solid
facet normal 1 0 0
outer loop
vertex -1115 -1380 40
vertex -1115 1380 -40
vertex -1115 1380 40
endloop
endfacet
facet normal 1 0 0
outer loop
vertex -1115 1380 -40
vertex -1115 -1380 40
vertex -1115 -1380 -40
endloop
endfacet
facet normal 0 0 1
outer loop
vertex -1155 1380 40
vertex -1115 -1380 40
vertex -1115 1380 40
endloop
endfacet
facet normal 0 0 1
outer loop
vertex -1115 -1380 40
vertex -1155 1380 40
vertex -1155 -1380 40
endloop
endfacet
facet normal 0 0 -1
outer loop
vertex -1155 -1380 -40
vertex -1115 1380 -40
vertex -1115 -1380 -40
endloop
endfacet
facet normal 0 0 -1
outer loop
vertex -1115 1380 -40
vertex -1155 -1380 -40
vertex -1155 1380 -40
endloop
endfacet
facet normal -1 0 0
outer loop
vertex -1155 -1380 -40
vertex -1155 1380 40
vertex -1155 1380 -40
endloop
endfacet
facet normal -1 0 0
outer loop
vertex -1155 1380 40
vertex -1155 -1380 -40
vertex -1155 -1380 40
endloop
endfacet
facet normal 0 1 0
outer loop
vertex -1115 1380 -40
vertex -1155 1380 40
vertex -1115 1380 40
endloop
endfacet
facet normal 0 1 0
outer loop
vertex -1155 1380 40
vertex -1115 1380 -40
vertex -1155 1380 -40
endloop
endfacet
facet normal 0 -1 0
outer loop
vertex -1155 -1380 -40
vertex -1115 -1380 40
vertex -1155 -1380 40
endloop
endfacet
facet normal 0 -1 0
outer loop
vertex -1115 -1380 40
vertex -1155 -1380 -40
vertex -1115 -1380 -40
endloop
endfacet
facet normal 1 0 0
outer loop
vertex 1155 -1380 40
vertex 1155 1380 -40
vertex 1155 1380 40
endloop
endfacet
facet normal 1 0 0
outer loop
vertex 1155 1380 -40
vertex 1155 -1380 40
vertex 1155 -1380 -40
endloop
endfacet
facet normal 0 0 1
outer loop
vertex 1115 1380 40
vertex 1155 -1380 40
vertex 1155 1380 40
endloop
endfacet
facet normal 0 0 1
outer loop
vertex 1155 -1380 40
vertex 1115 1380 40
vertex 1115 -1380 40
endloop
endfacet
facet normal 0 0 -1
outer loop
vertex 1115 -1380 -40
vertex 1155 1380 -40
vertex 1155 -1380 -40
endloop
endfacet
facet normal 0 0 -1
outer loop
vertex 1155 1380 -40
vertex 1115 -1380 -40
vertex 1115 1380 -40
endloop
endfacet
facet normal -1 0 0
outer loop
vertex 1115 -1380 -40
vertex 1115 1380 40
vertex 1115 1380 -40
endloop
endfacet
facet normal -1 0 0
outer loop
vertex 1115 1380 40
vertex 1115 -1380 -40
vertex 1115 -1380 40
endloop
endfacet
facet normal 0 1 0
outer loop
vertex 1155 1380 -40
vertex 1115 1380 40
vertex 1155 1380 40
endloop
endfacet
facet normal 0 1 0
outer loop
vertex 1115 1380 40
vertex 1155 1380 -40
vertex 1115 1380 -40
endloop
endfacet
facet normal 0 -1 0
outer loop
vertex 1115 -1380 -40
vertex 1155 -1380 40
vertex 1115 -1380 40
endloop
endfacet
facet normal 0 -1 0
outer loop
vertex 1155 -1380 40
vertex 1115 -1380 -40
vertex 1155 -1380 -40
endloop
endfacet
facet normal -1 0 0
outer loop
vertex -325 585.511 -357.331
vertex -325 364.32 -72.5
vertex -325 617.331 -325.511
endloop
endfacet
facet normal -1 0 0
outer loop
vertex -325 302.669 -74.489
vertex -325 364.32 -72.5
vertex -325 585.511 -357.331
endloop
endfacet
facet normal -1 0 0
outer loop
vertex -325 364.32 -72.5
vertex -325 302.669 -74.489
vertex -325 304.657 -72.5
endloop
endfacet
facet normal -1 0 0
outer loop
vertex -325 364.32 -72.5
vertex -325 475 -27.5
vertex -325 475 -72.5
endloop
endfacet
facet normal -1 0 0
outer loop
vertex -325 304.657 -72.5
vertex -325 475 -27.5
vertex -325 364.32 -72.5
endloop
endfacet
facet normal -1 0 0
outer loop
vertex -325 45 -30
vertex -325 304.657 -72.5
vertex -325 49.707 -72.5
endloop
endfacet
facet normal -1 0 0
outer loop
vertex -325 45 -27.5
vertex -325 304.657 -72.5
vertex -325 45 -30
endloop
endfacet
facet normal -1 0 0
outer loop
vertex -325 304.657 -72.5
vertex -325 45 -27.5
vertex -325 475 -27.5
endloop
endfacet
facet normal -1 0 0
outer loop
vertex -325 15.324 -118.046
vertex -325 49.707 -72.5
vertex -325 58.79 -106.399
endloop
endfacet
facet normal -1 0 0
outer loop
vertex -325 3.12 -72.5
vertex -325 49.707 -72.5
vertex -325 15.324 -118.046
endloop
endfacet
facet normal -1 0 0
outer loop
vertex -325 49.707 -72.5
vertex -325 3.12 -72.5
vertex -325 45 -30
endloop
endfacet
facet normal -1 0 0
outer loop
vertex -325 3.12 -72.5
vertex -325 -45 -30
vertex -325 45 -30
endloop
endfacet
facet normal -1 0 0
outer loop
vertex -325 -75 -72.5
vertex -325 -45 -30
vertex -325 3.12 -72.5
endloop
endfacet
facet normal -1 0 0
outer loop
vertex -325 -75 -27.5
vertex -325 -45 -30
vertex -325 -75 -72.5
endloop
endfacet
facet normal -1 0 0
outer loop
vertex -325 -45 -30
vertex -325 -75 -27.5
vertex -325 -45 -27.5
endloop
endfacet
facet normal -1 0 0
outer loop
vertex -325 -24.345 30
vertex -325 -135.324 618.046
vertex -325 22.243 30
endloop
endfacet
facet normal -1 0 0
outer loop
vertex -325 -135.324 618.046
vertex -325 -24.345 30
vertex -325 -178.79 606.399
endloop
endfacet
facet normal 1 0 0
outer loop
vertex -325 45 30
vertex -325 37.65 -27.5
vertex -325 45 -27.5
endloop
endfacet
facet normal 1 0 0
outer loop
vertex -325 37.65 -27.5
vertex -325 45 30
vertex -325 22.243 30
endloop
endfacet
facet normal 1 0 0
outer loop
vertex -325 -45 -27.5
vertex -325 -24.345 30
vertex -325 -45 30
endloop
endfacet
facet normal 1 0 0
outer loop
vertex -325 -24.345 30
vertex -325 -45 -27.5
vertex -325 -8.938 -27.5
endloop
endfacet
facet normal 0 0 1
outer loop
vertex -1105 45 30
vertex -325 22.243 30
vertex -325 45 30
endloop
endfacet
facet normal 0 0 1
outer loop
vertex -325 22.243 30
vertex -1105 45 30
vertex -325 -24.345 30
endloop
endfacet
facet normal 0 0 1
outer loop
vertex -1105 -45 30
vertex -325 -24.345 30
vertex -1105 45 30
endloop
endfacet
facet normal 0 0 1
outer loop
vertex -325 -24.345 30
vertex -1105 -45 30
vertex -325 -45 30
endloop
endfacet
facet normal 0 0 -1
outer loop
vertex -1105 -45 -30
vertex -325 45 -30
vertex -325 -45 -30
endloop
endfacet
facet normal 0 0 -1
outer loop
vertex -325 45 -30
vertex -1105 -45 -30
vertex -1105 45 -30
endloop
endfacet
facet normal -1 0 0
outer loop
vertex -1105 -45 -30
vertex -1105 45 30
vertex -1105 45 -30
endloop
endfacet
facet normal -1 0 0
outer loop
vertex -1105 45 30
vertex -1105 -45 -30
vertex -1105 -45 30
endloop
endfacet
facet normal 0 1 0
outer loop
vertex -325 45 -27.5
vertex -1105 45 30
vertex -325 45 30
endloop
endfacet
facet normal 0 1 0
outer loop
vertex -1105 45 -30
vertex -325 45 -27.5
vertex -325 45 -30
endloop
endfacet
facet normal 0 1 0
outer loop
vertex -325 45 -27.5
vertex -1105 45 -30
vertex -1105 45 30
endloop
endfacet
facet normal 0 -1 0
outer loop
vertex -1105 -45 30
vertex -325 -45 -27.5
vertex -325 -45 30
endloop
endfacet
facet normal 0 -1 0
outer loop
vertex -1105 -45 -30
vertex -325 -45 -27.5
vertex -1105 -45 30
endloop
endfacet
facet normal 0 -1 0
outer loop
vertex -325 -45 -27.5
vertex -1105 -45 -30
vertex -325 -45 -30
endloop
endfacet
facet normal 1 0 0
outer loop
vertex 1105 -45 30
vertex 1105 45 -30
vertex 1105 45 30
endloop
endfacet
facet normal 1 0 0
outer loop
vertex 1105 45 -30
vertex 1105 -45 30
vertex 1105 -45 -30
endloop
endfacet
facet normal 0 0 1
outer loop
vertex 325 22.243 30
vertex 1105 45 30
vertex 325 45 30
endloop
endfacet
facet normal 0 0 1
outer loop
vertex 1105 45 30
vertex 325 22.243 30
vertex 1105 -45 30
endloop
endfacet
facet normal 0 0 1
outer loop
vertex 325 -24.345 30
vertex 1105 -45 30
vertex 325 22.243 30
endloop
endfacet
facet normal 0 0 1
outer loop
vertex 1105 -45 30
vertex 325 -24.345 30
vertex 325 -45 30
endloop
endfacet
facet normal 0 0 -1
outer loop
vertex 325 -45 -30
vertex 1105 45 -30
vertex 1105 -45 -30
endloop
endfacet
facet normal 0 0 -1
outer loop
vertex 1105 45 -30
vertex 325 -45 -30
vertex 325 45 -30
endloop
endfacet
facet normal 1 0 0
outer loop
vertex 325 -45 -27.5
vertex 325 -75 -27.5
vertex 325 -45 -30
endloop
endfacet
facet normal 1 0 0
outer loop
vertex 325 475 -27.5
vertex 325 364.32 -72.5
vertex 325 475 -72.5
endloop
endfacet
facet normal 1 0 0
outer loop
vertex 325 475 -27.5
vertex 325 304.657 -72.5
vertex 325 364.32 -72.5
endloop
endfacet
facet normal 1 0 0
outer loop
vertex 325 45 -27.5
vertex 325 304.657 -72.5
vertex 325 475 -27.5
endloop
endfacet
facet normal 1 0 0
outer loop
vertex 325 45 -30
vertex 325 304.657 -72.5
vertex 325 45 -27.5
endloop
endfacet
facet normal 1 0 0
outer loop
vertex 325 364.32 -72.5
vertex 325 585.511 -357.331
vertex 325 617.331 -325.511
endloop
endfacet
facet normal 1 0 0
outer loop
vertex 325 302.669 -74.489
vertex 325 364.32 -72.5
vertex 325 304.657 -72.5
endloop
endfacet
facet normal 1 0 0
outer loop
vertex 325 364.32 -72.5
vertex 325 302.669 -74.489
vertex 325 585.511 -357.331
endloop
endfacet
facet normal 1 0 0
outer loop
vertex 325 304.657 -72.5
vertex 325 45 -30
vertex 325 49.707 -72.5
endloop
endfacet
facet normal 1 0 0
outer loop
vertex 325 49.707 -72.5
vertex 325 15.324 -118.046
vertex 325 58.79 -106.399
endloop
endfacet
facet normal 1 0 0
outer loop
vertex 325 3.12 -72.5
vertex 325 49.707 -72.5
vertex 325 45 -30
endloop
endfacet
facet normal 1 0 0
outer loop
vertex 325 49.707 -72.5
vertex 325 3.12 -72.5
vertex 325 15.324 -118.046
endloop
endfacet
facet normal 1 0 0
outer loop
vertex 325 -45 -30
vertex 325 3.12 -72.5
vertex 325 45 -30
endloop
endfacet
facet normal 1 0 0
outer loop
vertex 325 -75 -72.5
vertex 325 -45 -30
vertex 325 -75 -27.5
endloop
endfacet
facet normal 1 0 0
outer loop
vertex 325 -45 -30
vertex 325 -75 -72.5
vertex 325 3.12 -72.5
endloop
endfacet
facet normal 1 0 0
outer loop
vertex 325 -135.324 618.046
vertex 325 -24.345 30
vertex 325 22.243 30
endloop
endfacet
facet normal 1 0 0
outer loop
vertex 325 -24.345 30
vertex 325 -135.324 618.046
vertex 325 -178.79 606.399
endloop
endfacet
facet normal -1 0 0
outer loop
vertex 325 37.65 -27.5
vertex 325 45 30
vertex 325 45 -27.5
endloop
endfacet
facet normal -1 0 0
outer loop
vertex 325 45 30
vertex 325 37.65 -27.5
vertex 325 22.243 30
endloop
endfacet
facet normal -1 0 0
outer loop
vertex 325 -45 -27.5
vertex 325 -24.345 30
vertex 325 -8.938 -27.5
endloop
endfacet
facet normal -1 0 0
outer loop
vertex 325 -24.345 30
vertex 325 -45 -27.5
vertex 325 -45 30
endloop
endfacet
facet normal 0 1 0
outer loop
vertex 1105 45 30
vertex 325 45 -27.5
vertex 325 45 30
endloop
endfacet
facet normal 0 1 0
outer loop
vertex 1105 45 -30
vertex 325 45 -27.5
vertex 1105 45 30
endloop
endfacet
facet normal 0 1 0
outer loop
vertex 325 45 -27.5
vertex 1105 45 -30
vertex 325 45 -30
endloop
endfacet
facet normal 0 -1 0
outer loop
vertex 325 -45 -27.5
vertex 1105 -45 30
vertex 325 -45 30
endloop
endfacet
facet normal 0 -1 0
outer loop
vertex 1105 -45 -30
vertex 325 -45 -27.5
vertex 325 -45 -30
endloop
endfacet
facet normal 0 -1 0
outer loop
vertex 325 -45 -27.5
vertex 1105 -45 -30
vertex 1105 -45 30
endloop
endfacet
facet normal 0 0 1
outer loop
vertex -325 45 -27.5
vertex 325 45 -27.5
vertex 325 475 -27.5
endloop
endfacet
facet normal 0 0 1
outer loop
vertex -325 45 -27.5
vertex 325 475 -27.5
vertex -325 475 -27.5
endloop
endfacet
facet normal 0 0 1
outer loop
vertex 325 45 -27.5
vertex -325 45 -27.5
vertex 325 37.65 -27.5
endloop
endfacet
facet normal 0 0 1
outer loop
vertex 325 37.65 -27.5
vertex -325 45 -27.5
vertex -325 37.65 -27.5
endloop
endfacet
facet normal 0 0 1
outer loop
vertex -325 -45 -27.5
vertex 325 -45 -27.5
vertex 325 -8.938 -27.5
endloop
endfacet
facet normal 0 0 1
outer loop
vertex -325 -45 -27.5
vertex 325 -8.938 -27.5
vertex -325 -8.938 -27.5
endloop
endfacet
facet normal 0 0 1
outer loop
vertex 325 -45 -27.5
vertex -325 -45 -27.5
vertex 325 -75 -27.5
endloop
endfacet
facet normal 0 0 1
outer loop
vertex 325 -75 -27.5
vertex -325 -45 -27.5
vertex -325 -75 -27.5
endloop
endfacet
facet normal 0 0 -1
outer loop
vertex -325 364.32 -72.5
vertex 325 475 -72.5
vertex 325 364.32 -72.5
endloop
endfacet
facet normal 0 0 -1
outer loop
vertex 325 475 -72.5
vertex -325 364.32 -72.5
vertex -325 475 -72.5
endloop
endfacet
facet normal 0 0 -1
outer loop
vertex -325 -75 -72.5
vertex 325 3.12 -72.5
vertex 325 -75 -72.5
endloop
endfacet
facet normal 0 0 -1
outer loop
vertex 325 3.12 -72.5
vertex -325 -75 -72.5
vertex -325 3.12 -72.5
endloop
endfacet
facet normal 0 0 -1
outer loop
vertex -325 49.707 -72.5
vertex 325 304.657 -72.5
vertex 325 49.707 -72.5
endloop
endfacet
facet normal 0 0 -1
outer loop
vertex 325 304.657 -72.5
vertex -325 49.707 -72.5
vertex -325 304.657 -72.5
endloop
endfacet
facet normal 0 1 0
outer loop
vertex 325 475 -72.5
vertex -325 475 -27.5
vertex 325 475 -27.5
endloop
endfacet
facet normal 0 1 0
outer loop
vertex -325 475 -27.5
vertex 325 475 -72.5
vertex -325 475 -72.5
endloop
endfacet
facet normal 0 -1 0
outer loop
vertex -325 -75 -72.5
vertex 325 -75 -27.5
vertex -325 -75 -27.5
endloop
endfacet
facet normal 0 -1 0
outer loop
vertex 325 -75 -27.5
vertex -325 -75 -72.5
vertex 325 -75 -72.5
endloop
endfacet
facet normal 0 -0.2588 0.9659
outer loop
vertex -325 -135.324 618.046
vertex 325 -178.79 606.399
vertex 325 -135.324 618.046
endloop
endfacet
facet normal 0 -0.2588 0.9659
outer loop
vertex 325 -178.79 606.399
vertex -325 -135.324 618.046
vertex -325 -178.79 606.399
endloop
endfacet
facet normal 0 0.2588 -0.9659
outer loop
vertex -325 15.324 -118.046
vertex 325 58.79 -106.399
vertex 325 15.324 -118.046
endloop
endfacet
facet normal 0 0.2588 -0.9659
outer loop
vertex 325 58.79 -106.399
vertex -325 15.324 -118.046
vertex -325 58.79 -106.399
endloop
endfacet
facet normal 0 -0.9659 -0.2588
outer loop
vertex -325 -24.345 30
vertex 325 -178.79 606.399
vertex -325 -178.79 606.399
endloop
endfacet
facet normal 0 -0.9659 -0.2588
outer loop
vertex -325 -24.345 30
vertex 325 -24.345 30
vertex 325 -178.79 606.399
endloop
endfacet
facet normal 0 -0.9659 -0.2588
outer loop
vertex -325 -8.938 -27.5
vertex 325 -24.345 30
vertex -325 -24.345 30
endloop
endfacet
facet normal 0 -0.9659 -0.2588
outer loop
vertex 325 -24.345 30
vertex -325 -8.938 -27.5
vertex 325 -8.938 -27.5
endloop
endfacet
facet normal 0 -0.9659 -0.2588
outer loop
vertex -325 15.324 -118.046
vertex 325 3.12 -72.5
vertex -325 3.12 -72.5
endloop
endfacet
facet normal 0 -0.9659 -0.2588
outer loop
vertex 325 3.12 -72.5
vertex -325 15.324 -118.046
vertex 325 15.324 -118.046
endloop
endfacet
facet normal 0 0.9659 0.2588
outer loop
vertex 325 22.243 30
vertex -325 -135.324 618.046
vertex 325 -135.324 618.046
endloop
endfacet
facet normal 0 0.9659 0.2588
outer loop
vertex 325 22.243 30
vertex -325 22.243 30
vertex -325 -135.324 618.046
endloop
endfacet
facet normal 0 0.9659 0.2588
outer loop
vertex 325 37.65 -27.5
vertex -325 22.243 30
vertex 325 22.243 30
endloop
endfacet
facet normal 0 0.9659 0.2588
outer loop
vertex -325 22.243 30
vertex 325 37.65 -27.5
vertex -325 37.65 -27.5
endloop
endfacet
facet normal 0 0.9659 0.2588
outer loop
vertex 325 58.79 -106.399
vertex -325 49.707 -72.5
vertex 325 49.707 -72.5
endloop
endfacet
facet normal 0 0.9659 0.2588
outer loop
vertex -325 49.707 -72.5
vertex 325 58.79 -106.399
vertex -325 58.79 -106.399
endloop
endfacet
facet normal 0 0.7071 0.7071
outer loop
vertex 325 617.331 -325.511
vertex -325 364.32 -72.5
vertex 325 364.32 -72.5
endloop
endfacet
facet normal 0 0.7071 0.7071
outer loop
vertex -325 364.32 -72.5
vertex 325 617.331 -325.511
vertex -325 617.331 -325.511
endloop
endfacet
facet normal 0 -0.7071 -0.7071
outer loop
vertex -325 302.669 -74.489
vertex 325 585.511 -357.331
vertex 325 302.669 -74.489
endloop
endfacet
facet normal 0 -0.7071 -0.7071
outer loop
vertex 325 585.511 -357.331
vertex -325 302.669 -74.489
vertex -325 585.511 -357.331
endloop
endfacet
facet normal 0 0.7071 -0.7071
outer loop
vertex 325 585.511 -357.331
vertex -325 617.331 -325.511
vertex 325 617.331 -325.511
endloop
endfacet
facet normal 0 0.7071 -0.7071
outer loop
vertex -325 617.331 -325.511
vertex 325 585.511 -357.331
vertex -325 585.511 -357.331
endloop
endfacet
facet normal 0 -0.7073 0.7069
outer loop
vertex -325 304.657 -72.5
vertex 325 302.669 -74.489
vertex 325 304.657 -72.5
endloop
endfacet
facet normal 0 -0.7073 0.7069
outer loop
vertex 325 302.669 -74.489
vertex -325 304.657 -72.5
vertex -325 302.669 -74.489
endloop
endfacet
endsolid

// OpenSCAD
// ============================================================================
// PROJECT: XXXG-00W0 WING GUNDAM ZERO EW - PILOT OPERATIONS VAULT
// COMPONENT: TRANSFORMING SEAT BUCKET FRAME (TRANSFORMING_PILOT_SEAT.SCAD)
// PACKAGING CONFIG: DUAL-SIDE LONGITUDINAL CYLINDER WALL TRACK INTERLOCKS
// CONFIG METRIC: SCALED TITANIUM CASTS (1:1 ACTUAL METRIC UP-SCALE)
// ============================================================================

$fn = 80; // High-fidelity circular resolution segment count

// Structural Cockpit Constraints (1:1 Metric Airframe Scale - mm)
inner_diameter = 2310;                  // Orion clear internal diameter boundary (mm)
inner_length = 2760;                    // Clear internal cabin depth path (mm)
seat_width = 650;                       // Central pilot bucket frame width (mm)
track_arm_extension = 780;              // Extension length from seat center to wall tracks (mm)
link_thickness = 45;                    // Solid TiAl structural link plating thickness (mm)

// Transformation Mode Selection (0 = Stowed Flat, 1 = Flight Bucket, 2 = Dental Bed)
transformation_state = 1; 

module Master_Pilot_Seat_Assembly() {
    // 1. Render Symmetrical Left & Right Longitudinal Cylinder Wall Tracks
    color([0.3, 0.3, 0.32]) {
        translate([-inner_diameter/2 + 20, 0, 0]) cube([40, inner_length, 80], center = true);
        translate([inner_diameter/2 - 20, 0, 0])  cube([40, inner_length, 80], center = true);
    }
    
    // 2. Render Symmetrical Dual-Side Load-Bearing Tracking Arms
    color([0.45, 0.45, 0.48]) { // Deep Titanium Industrial Spec
        translate([-track_arm_extension/2 - seat_width/2, 0, 0]) cube([track_arm_extension, 90, 60], center = true);
        translate([track_arm_extension/2 + seat_width/2, 0, 0])  cube([track_arm_extension, 90, 60], center = true);
    }
    
    // 3. Render Articulating Seat Bucket Components Based on Hexadecimal State Input
    if (transformation_state == 0) {
        // FLAT BULKHEAD STOWED CONFIGURATION (Locked flush against rear wall)
        translate([0, -inner_length/2 + 100, 0]) Build_Stowed_Flat_Profile();
    } else if (transformation_state == 2) {
        // ERGONOMIC DENTAL STABILIZATION BED CONFIGURATION (High-G Shock Dousing)
        translate([0, 0, -100]) Build_Dental_Bed_Profile();
    } else {
        // STANDARD FLIGHT BUCKET MODE (Nominal Upright Operations)
        translate([0, 200, -50]) Build_Flight_Bucket_Profile();
    }
}

module Build_Flight_Bucket_Profile() {
    // Seating Surface Base Plate
    cube([seat_width, 550, link_thickness], center = true);
    
    // Upright 75-Degree Backrest Frame
    translate([0, -260, 300]) rotate([15, 0, 0])
        cube([seat_width, link_thickness, 750], center = true);
        
    // Angled Lower Leg Support Linkage
    translate([0, 260, -150]) rotate([-45, 0, 0])
        cube([seat_width, 400, link_thickness], center = true);
}

module Build_Dental_Bed_Profile() {
    // Flattened Seating Surface Base Plate
    cube([seat_width, 600, link_thickness], center = true);
    
    // Reclined 18-Degree Backrest Frame
    translate([0, -380, 120]) rotate([72, 0, 0])
        cube([seat_width, link_thickness, 750], center = true);
        
    // Horizontally Extended Lower Leg Support Rails
    translate([0, 480, 0])
        cube([seat_width, 500, link_thickness], center = true);
}

module Build_Stowed_Flat_Profile() {
    // All structural sections collapsed into a single 90mm thick planar stack
    cube([seat_width, link_thickness, 600], center = true);
    translate([0, 0, link_thickness])
        cube([seat_width, link_thickness, 750], center = true);
}

// Render Master Component to Parameter Workspace
Master_Pilot_Seat_Assembly();
